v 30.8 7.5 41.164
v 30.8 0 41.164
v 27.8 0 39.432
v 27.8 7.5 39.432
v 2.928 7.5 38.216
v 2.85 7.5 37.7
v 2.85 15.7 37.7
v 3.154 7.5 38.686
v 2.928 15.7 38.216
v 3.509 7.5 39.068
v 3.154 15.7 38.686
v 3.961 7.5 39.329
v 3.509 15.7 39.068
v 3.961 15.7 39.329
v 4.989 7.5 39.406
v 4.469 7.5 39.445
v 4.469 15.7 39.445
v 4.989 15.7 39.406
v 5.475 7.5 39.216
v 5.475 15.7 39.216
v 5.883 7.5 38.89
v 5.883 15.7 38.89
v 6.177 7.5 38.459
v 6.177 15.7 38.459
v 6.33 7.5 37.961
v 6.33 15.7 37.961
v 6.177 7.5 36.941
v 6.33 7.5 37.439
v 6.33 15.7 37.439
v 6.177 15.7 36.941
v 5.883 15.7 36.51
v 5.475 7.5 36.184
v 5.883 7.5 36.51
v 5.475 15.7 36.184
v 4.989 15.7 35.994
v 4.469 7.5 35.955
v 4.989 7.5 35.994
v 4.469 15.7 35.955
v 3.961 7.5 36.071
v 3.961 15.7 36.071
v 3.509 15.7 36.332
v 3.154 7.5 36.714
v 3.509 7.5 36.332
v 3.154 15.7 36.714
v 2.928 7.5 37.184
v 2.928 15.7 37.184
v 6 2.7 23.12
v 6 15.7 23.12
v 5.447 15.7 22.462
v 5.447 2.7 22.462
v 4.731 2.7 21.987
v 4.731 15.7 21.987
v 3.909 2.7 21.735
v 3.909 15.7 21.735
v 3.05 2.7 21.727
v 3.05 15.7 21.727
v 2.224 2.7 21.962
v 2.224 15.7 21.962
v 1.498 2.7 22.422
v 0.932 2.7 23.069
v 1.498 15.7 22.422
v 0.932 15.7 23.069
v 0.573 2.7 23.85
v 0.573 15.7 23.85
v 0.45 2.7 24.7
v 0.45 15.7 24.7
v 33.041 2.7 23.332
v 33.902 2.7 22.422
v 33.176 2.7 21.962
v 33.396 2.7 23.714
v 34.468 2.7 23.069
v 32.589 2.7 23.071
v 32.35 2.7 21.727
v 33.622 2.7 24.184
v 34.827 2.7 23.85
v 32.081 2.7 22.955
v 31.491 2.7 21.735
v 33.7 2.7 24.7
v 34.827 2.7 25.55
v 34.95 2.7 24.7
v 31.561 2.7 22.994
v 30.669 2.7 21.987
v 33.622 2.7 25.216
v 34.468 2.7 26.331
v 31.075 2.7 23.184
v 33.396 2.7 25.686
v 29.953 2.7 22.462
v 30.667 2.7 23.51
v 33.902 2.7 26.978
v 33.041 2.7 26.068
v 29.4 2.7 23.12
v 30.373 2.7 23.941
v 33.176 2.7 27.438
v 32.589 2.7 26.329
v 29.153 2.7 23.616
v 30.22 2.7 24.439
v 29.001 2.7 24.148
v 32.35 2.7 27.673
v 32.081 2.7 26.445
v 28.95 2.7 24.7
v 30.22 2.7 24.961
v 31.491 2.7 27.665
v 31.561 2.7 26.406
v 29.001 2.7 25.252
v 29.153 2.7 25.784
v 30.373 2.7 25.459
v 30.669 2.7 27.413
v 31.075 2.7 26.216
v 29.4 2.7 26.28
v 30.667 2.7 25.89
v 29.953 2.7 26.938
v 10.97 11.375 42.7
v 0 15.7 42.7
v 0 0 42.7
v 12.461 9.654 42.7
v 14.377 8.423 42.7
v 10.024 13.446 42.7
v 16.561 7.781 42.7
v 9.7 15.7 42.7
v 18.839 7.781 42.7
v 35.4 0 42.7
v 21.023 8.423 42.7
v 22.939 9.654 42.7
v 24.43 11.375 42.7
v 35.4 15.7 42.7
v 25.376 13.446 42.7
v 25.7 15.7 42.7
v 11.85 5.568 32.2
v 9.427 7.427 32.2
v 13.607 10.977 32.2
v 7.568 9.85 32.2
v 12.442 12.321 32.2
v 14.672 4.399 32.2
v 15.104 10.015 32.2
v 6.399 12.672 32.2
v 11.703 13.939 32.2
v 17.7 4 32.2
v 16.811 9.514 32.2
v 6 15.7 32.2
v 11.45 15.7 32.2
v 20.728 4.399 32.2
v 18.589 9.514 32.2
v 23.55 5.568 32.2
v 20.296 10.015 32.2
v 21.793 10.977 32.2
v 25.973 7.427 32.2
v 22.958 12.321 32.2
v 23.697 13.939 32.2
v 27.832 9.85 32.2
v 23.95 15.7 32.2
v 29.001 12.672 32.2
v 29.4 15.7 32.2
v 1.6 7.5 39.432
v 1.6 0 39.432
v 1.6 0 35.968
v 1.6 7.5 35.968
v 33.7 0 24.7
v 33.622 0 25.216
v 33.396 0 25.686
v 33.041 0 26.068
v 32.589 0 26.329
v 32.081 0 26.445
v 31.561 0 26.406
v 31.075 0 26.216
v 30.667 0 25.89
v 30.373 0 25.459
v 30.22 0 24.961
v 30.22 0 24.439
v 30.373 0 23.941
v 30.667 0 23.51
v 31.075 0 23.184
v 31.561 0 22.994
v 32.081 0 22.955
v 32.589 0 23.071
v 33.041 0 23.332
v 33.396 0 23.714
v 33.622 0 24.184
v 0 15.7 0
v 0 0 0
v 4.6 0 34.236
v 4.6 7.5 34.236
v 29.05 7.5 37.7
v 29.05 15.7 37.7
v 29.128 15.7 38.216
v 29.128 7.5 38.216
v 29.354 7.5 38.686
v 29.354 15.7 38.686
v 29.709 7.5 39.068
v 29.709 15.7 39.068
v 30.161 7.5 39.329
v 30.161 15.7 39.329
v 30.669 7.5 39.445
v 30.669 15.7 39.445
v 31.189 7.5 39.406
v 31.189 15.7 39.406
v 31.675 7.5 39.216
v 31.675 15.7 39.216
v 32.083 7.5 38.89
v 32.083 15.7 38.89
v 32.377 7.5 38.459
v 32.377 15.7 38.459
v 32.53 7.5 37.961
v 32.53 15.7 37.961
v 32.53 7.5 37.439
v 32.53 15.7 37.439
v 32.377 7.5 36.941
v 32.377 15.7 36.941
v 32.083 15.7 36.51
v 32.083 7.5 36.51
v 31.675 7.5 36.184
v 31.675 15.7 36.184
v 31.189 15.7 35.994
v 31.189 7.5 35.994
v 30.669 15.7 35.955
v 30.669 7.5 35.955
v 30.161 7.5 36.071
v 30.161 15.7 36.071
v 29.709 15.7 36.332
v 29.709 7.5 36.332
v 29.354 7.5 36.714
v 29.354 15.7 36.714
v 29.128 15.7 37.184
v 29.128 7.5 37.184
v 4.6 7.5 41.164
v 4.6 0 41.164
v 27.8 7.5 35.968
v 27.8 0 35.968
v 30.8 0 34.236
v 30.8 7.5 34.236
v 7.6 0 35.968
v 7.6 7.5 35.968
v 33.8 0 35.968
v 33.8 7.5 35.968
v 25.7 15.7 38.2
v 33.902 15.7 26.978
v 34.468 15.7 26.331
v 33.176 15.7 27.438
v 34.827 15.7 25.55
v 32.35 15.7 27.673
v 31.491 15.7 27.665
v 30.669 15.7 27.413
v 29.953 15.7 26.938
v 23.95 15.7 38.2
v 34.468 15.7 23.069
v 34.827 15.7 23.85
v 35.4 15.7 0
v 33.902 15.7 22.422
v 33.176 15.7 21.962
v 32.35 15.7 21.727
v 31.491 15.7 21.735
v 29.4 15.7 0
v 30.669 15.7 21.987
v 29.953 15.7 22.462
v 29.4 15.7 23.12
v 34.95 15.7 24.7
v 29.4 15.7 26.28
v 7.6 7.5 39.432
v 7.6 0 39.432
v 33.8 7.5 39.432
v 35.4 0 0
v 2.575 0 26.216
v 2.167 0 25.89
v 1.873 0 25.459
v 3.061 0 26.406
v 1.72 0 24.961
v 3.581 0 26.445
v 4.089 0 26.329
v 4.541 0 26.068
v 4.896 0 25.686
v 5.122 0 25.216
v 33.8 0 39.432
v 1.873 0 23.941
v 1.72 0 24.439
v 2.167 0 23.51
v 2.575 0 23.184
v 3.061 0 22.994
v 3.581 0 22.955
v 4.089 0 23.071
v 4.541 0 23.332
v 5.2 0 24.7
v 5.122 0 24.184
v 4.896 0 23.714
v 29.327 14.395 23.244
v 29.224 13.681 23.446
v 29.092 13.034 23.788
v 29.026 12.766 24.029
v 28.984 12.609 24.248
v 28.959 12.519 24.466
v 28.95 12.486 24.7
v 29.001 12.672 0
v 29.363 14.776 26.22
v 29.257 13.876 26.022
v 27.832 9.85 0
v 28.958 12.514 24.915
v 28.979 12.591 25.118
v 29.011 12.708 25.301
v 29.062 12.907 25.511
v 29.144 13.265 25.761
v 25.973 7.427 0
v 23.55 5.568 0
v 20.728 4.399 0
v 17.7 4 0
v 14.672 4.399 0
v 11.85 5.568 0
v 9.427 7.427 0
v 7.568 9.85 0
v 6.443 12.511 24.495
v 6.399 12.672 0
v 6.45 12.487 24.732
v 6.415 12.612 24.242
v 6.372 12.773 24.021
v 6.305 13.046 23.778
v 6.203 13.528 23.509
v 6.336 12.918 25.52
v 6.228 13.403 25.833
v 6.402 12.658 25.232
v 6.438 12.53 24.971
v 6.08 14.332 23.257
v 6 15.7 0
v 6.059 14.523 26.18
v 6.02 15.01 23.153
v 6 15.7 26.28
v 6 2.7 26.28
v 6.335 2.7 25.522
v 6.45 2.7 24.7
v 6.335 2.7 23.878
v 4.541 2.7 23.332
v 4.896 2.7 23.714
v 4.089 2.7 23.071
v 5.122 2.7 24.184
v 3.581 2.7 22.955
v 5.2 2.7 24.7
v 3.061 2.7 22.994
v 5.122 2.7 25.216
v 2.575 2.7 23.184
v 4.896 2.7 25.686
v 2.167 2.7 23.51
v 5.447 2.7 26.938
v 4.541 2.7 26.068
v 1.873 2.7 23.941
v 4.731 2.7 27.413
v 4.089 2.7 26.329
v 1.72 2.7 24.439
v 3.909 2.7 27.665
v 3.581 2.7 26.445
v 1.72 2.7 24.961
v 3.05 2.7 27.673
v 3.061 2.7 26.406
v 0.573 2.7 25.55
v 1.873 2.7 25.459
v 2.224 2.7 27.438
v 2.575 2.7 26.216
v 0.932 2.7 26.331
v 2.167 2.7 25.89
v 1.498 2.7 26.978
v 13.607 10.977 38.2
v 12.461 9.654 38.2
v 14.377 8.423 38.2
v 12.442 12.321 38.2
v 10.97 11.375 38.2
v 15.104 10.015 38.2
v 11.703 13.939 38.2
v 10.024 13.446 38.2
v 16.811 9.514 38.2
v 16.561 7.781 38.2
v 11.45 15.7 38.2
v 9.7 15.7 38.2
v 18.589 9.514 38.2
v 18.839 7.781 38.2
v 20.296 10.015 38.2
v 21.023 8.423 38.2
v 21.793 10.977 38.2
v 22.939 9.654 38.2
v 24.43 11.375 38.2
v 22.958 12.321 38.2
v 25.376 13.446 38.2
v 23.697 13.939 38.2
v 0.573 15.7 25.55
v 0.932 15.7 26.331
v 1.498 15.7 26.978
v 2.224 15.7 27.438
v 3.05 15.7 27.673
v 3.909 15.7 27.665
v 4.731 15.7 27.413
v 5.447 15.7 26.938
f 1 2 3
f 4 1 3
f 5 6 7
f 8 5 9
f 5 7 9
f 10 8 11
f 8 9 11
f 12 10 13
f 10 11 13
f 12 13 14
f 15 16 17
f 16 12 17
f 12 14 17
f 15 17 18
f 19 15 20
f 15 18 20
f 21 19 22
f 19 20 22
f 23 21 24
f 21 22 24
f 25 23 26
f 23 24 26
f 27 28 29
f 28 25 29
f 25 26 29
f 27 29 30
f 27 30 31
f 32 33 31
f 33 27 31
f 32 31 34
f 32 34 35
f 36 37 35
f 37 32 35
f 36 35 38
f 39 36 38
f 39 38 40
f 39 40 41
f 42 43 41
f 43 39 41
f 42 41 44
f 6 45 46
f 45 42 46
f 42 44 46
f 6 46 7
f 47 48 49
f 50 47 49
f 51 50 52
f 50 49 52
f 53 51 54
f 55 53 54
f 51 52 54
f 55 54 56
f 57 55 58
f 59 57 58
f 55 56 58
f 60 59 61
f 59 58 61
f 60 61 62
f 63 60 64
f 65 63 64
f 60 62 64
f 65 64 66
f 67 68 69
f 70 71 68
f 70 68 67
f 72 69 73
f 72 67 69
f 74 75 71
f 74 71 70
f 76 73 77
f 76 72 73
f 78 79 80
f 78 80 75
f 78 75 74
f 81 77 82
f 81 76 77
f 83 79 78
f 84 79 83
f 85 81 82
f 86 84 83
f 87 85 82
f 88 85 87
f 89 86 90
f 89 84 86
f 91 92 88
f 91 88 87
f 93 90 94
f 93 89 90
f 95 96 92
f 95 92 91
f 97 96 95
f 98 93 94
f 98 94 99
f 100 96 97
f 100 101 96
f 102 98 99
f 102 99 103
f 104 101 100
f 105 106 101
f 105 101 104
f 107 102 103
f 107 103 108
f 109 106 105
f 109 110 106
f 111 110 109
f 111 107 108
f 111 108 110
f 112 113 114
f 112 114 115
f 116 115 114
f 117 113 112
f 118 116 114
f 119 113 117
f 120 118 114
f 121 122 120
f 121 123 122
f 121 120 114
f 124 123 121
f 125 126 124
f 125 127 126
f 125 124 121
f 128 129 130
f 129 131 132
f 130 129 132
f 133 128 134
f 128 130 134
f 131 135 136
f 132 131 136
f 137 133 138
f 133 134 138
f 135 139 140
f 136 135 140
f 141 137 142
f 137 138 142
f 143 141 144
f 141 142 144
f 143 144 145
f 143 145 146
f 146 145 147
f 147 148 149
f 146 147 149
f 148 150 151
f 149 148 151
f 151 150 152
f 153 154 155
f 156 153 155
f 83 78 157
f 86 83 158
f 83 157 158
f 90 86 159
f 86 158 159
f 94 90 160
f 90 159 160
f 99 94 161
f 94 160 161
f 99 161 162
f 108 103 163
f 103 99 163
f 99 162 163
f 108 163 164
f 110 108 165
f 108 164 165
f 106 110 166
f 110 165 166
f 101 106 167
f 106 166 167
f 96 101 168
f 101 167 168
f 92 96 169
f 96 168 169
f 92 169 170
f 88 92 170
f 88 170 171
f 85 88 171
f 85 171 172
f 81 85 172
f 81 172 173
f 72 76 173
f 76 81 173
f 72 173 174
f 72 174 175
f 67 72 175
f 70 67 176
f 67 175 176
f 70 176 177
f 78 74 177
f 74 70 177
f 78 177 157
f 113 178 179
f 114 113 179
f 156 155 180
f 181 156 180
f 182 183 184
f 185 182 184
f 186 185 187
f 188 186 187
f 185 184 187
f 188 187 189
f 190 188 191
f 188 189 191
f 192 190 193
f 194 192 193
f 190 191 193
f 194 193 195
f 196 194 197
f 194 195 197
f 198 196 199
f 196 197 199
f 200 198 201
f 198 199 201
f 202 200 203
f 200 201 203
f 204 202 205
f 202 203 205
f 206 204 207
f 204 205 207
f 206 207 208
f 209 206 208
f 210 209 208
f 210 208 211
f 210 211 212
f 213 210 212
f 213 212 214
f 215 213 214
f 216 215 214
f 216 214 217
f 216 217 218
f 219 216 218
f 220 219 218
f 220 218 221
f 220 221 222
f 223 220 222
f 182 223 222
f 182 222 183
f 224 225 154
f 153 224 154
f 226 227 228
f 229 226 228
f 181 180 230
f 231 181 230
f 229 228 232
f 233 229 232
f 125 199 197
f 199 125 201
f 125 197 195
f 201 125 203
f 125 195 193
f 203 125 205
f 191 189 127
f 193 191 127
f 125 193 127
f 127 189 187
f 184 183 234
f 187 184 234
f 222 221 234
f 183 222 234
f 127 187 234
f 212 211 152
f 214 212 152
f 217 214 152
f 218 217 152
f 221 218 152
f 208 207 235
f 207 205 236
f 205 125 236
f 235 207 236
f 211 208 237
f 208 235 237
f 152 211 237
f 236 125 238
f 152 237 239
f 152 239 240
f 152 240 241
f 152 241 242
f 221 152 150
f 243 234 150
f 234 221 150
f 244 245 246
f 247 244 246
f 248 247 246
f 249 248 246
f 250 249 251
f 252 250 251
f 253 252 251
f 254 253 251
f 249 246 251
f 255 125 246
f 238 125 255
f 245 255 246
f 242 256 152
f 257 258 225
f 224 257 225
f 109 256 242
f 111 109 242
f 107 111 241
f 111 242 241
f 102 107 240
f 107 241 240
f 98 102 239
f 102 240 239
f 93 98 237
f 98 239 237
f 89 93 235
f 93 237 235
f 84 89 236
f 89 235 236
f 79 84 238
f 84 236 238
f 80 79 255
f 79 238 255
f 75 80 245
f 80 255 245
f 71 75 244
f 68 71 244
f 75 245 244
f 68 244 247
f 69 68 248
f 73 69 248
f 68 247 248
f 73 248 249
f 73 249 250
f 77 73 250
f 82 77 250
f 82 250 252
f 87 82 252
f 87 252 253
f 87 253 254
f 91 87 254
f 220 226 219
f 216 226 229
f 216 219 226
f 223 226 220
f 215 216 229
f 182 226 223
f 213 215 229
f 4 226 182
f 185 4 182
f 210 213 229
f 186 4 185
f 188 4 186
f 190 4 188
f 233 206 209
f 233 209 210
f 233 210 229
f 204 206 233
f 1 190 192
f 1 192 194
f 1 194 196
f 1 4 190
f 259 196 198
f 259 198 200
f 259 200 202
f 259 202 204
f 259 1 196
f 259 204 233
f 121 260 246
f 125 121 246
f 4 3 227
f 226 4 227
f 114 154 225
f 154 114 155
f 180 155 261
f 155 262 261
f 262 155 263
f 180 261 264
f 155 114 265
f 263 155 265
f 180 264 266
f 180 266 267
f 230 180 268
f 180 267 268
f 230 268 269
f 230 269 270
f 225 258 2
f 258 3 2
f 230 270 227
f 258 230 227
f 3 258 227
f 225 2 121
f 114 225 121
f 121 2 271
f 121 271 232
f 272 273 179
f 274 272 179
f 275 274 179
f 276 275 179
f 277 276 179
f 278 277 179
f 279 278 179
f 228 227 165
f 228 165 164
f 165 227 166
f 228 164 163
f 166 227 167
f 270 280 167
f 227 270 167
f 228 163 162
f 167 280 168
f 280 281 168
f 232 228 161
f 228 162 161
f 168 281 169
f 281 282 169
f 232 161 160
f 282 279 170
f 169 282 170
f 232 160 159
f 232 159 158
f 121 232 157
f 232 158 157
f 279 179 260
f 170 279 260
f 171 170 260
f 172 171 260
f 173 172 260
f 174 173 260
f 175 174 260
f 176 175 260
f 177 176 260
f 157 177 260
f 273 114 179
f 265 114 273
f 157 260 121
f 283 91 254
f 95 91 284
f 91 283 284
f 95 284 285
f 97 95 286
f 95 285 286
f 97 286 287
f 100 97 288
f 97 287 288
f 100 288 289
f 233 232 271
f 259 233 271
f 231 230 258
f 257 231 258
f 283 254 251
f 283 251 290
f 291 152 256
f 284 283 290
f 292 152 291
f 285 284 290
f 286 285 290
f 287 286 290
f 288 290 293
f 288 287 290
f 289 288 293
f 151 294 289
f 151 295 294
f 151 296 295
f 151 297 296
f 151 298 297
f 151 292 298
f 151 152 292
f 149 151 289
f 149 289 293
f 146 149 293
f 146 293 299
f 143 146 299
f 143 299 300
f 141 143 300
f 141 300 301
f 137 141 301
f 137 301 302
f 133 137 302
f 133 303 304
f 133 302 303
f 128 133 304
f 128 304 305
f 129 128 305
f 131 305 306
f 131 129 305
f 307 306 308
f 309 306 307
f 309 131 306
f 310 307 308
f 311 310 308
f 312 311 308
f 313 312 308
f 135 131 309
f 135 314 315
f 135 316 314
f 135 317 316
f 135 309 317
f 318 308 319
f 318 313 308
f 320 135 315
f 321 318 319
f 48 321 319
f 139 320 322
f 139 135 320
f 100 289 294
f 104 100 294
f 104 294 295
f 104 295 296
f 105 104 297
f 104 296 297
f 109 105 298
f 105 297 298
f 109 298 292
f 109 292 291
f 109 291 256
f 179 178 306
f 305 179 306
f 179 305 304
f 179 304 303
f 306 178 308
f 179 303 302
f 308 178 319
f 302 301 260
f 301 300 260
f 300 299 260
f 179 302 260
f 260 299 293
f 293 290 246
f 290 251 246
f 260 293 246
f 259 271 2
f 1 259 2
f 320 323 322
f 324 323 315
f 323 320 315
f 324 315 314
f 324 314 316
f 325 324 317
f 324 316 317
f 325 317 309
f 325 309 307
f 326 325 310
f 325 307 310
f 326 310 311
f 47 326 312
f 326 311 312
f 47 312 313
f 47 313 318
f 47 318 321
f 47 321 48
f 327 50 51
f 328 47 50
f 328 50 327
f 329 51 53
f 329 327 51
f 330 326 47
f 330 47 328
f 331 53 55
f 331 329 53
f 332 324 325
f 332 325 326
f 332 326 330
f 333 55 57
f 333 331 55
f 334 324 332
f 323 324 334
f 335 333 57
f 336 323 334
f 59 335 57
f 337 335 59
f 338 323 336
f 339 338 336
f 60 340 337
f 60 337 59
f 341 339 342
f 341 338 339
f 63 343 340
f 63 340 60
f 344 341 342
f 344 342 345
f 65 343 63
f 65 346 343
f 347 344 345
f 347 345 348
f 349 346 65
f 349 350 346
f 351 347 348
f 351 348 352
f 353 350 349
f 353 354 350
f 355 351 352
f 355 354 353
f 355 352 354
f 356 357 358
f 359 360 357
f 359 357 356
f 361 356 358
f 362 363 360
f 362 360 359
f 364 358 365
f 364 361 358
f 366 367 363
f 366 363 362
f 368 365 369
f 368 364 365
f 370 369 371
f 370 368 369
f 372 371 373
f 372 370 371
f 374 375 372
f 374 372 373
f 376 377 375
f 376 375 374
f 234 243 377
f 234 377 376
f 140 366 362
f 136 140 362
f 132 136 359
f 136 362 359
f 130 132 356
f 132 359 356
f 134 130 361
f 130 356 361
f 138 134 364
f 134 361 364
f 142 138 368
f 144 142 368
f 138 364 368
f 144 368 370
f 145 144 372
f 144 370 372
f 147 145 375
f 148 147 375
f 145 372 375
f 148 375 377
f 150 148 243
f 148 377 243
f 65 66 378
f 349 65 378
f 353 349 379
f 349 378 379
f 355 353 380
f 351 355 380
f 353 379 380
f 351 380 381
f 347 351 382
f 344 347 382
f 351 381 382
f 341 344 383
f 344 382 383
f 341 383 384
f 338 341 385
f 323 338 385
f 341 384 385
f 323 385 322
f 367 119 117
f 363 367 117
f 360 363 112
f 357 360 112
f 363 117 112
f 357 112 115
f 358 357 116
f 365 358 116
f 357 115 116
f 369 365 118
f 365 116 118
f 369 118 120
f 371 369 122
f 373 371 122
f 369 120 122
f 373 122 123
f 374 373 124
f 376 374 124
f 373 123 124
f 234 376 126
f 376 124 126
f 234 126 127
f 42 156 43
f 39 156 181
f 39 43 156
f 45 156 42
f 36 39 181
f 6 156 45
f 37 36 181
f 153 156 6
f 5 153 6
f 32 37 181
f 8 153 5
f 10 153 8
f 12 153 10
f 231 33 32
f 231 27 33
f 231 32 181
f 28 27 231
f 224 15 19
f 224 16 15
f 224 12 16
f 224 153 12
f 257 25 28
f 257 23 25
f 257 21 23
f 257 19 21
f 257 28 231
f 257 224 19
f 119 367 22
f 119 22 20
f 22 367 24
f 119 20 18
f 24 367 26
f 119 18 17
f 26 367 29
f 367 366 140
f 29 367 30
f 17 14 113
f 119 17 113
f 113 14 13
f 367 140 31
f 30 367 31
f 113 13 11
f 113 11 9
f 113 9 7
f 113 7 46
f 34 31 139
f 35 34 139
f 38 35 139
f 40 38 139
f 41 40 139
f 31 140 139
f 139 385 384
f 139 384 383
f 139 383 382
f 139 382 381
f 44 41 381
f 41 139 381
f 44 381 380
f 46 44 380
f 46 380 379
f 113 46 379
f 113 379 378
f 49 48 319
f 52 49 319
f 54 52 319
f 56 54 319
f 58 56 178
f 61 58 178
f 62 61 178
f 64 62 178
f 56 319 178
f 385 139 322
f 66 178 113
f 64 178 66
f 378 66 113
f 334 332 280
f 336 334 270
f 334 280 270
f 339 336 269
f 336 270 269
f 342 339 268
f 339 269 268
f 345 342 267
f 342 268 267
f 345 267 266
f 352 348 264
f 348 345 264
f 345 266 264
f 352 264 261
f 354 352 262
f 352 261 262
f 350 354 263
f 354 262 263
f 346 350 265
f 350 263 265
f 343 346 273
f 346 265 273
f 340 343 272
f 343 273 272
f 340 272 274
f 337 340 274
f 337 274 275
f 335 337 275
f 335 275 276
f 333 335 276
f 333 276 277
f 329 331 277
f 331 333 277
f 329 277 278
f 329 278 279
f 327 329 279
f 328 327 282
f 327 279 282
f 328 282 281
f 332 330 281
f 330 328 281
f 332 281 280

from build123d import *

# Parameters (mm, degrees)
F1_DEPTH  = 42.7
F3_DEPTH  = 4.5
F5_DEPTH  = 6
F6_R      = 8
F7_DEPTH  = 50
F8_R      = 11.7
F9_DEPTH  = 40
F10_R     = 1.75
F11_DEPTH = 25
F12_R     = 1.75
F13_DEPTH = 13
F14_R     = 1.75
F15_DEPTH = 13
F16_R     = 1.75
F17_DEPTH = 25
F18_R     = 1.75
F19_DEPTH = 7.5


with BuildPart() as f1:
    # F0 (on Top) → F1 (new body)
    with BuildSketch(Plane.XY):
        Polygon((0, 15.7), (0, 0), (35.4, 0), (35.4, 15.7), (23.2, 15.7), (7.2, 15.7), align=None)
    extrude(amount=F1_DEPTH)

    # F2 (on face) → F3 (cut)
    with BuildSketch(Plane.XY.offset(42.7)):
        with BuildLine():
            ThreePointArc((9.7, 15.7), (17.7, 7.7), (25.7, 15.7))
            Line((25.7, 15.7), (9.7, 15.7))
        make_face()
    extrude(amount=-F3_DEPTH, mode=Mode.SUBTRACT)

    # F4 (on face) → F5 (cut)
    with BuildSketch(Plane.XY.offset(38.2)):
        with BuildLine():
            ThreePointArc((11.45, 15.7), (17.7, 9.45), (23.95, 15.7))
            Line((23.95, 15.7), (11.45, 15.7))
        make_face()
    extrude(amount=-F5_DEPTH, mode=Mode.SUBTRACT)

    # F6 (on face) → F7 (cut)
    with BuildSketch(Plane.XY.offset(32.2)):
        with Locations((17.7, 15.7)):
            Circle(F6_R)
    extrude(amount=-F7_DEPTH, mode=Mode.SUBTRACT)

    # F8 (on face) → F9 (cut)
    with BuildSketch(Plane(origin=(0, 0, 32.2), x_dir=(1, 0, 0), z_dir=(0, 0, -1))):
        with Locations((17.7, -15.7)):
            Circle(F8_R)
    extrude(amount=F9_DEPTH, mode=Mode.SUBTRACT)

    # F10 (on face) → F11 (cut)
    with BuildSketch(Plane.XZ):
        with Locations((3.45, 24.7)):
            Circle(F10_R)
        with Locations((31.95, 24.7)):
            Circle(F10_R)
    extrude(amount=-F11_DEPTH, mode=Mode.SUBTRACT)

    # F12 (on face) → F13 (cut)
    with BuildSketch(Plane(origin=(0, 15.7, 0), x_dir=(-1, 0, 0), z_dir=(0, 1, 0))):
        with BuildLine():
            Line((-29.4, 23.1196519371), (-29.4, 26.2803480629))
            ThreePointArc((-29.4, 26.2803480629), (-34.95, 24.7), (-29.4, 23.1196519371))
        make_face()
        with Locations((-31.95, 24.7)):
            Circle(F12_R, mode=Mode.SUBTRACT)
        with BuildLine():
            ThreePointArc((-29.4, 23.1196519371), (-29.0646923907, 23.8784161637), (-28.95, 24.7))
            ThreePointArc((-28.95, 24.7), (-29.0646923907, 25.5215838363), (-29.4, 26.2803480629))
            Line((-29.4, 26.2803480629), (-29.4, 23.1196519371))
        make_face()
    extrude(amount=-F13_DEPTH, mode=Mode.SUBTRACT)

    # F14 (on face) → F15 (cut)
    with BuildSketch(Plane(origin=(0, 15.7, 0), x_dir=(-1, 0, 0), z_dir=(0, 1, 0))):
        with BuildLine():
            Line((-6, 23.1196519371), (-6, 26.2803480629))
            ThreePointArc((-6, 26.2803480629), (-6.45, 24.7), (-6, 23.1196519371))
        make_face()
        with BuildLine():
            ThreePointArc((-6, 23.1196519371), (-2.6284161637, 21.8146923907), (-0.45, 24.7))
            ThreePointArc((-0.45, 24.7), (-2.6284161637, 27.5853076093), (-6, 26.2803480629))
            Line((-6, 26.2803480629), (-6, 23.1196519371))
        make_face()
        with Locations((-3.45, 24.7)):
            Circle(F14_R, mode=Mode.SUBTRACT)
    extrude(amount=-F15_DEPTH, mode=Mode.SUBTRACT)

    # F16 (on face) → F17 (cut)
    with BuildSketch(Plane(origin=(0, 15.7, 0), x_dir=(-1, 0, 0), z_dir=(0, 1, 0))):
        with Locations((-30.8, 37.7)):
            Circle(F16_R)
        with Locations((-4.6, 37.7)):
            Circle(F16_R)
    extrude(amount=-F17_DEPTH, mode=Mode.SUBTRACT)

    # F18 (on face) → F19 (cut)
    with BuildSketch(Plane.XZ):
        Polygon((7.6, 35.9679491924), (7.6, 39.4320508076), (4.6, 41.1641016151), (1.6, 39.4320508076), (1.6, 35.9679491924), (4.6, 34.2358983849), align=None)
        with Locations((4.6, 37.7)):
            Circle(F18_R, mode=Mode.SUBTRACT)
        Polygon((27.8, 39.4320508076), (27.8, 35.9679491924), (30.8, 34.2358983849), (33.8, 35.9679491924), (33.8, 39.4320508076), (30.8, 41.1641016151), align=None)
        with Locations((30.8, 37.7)):
            Circle(F18_R, mode=Mode.SUBTRACT)
    extrude(amount=-F19_DEPTH, mode=Mode.SUBTRACT)


solid = f1.part
